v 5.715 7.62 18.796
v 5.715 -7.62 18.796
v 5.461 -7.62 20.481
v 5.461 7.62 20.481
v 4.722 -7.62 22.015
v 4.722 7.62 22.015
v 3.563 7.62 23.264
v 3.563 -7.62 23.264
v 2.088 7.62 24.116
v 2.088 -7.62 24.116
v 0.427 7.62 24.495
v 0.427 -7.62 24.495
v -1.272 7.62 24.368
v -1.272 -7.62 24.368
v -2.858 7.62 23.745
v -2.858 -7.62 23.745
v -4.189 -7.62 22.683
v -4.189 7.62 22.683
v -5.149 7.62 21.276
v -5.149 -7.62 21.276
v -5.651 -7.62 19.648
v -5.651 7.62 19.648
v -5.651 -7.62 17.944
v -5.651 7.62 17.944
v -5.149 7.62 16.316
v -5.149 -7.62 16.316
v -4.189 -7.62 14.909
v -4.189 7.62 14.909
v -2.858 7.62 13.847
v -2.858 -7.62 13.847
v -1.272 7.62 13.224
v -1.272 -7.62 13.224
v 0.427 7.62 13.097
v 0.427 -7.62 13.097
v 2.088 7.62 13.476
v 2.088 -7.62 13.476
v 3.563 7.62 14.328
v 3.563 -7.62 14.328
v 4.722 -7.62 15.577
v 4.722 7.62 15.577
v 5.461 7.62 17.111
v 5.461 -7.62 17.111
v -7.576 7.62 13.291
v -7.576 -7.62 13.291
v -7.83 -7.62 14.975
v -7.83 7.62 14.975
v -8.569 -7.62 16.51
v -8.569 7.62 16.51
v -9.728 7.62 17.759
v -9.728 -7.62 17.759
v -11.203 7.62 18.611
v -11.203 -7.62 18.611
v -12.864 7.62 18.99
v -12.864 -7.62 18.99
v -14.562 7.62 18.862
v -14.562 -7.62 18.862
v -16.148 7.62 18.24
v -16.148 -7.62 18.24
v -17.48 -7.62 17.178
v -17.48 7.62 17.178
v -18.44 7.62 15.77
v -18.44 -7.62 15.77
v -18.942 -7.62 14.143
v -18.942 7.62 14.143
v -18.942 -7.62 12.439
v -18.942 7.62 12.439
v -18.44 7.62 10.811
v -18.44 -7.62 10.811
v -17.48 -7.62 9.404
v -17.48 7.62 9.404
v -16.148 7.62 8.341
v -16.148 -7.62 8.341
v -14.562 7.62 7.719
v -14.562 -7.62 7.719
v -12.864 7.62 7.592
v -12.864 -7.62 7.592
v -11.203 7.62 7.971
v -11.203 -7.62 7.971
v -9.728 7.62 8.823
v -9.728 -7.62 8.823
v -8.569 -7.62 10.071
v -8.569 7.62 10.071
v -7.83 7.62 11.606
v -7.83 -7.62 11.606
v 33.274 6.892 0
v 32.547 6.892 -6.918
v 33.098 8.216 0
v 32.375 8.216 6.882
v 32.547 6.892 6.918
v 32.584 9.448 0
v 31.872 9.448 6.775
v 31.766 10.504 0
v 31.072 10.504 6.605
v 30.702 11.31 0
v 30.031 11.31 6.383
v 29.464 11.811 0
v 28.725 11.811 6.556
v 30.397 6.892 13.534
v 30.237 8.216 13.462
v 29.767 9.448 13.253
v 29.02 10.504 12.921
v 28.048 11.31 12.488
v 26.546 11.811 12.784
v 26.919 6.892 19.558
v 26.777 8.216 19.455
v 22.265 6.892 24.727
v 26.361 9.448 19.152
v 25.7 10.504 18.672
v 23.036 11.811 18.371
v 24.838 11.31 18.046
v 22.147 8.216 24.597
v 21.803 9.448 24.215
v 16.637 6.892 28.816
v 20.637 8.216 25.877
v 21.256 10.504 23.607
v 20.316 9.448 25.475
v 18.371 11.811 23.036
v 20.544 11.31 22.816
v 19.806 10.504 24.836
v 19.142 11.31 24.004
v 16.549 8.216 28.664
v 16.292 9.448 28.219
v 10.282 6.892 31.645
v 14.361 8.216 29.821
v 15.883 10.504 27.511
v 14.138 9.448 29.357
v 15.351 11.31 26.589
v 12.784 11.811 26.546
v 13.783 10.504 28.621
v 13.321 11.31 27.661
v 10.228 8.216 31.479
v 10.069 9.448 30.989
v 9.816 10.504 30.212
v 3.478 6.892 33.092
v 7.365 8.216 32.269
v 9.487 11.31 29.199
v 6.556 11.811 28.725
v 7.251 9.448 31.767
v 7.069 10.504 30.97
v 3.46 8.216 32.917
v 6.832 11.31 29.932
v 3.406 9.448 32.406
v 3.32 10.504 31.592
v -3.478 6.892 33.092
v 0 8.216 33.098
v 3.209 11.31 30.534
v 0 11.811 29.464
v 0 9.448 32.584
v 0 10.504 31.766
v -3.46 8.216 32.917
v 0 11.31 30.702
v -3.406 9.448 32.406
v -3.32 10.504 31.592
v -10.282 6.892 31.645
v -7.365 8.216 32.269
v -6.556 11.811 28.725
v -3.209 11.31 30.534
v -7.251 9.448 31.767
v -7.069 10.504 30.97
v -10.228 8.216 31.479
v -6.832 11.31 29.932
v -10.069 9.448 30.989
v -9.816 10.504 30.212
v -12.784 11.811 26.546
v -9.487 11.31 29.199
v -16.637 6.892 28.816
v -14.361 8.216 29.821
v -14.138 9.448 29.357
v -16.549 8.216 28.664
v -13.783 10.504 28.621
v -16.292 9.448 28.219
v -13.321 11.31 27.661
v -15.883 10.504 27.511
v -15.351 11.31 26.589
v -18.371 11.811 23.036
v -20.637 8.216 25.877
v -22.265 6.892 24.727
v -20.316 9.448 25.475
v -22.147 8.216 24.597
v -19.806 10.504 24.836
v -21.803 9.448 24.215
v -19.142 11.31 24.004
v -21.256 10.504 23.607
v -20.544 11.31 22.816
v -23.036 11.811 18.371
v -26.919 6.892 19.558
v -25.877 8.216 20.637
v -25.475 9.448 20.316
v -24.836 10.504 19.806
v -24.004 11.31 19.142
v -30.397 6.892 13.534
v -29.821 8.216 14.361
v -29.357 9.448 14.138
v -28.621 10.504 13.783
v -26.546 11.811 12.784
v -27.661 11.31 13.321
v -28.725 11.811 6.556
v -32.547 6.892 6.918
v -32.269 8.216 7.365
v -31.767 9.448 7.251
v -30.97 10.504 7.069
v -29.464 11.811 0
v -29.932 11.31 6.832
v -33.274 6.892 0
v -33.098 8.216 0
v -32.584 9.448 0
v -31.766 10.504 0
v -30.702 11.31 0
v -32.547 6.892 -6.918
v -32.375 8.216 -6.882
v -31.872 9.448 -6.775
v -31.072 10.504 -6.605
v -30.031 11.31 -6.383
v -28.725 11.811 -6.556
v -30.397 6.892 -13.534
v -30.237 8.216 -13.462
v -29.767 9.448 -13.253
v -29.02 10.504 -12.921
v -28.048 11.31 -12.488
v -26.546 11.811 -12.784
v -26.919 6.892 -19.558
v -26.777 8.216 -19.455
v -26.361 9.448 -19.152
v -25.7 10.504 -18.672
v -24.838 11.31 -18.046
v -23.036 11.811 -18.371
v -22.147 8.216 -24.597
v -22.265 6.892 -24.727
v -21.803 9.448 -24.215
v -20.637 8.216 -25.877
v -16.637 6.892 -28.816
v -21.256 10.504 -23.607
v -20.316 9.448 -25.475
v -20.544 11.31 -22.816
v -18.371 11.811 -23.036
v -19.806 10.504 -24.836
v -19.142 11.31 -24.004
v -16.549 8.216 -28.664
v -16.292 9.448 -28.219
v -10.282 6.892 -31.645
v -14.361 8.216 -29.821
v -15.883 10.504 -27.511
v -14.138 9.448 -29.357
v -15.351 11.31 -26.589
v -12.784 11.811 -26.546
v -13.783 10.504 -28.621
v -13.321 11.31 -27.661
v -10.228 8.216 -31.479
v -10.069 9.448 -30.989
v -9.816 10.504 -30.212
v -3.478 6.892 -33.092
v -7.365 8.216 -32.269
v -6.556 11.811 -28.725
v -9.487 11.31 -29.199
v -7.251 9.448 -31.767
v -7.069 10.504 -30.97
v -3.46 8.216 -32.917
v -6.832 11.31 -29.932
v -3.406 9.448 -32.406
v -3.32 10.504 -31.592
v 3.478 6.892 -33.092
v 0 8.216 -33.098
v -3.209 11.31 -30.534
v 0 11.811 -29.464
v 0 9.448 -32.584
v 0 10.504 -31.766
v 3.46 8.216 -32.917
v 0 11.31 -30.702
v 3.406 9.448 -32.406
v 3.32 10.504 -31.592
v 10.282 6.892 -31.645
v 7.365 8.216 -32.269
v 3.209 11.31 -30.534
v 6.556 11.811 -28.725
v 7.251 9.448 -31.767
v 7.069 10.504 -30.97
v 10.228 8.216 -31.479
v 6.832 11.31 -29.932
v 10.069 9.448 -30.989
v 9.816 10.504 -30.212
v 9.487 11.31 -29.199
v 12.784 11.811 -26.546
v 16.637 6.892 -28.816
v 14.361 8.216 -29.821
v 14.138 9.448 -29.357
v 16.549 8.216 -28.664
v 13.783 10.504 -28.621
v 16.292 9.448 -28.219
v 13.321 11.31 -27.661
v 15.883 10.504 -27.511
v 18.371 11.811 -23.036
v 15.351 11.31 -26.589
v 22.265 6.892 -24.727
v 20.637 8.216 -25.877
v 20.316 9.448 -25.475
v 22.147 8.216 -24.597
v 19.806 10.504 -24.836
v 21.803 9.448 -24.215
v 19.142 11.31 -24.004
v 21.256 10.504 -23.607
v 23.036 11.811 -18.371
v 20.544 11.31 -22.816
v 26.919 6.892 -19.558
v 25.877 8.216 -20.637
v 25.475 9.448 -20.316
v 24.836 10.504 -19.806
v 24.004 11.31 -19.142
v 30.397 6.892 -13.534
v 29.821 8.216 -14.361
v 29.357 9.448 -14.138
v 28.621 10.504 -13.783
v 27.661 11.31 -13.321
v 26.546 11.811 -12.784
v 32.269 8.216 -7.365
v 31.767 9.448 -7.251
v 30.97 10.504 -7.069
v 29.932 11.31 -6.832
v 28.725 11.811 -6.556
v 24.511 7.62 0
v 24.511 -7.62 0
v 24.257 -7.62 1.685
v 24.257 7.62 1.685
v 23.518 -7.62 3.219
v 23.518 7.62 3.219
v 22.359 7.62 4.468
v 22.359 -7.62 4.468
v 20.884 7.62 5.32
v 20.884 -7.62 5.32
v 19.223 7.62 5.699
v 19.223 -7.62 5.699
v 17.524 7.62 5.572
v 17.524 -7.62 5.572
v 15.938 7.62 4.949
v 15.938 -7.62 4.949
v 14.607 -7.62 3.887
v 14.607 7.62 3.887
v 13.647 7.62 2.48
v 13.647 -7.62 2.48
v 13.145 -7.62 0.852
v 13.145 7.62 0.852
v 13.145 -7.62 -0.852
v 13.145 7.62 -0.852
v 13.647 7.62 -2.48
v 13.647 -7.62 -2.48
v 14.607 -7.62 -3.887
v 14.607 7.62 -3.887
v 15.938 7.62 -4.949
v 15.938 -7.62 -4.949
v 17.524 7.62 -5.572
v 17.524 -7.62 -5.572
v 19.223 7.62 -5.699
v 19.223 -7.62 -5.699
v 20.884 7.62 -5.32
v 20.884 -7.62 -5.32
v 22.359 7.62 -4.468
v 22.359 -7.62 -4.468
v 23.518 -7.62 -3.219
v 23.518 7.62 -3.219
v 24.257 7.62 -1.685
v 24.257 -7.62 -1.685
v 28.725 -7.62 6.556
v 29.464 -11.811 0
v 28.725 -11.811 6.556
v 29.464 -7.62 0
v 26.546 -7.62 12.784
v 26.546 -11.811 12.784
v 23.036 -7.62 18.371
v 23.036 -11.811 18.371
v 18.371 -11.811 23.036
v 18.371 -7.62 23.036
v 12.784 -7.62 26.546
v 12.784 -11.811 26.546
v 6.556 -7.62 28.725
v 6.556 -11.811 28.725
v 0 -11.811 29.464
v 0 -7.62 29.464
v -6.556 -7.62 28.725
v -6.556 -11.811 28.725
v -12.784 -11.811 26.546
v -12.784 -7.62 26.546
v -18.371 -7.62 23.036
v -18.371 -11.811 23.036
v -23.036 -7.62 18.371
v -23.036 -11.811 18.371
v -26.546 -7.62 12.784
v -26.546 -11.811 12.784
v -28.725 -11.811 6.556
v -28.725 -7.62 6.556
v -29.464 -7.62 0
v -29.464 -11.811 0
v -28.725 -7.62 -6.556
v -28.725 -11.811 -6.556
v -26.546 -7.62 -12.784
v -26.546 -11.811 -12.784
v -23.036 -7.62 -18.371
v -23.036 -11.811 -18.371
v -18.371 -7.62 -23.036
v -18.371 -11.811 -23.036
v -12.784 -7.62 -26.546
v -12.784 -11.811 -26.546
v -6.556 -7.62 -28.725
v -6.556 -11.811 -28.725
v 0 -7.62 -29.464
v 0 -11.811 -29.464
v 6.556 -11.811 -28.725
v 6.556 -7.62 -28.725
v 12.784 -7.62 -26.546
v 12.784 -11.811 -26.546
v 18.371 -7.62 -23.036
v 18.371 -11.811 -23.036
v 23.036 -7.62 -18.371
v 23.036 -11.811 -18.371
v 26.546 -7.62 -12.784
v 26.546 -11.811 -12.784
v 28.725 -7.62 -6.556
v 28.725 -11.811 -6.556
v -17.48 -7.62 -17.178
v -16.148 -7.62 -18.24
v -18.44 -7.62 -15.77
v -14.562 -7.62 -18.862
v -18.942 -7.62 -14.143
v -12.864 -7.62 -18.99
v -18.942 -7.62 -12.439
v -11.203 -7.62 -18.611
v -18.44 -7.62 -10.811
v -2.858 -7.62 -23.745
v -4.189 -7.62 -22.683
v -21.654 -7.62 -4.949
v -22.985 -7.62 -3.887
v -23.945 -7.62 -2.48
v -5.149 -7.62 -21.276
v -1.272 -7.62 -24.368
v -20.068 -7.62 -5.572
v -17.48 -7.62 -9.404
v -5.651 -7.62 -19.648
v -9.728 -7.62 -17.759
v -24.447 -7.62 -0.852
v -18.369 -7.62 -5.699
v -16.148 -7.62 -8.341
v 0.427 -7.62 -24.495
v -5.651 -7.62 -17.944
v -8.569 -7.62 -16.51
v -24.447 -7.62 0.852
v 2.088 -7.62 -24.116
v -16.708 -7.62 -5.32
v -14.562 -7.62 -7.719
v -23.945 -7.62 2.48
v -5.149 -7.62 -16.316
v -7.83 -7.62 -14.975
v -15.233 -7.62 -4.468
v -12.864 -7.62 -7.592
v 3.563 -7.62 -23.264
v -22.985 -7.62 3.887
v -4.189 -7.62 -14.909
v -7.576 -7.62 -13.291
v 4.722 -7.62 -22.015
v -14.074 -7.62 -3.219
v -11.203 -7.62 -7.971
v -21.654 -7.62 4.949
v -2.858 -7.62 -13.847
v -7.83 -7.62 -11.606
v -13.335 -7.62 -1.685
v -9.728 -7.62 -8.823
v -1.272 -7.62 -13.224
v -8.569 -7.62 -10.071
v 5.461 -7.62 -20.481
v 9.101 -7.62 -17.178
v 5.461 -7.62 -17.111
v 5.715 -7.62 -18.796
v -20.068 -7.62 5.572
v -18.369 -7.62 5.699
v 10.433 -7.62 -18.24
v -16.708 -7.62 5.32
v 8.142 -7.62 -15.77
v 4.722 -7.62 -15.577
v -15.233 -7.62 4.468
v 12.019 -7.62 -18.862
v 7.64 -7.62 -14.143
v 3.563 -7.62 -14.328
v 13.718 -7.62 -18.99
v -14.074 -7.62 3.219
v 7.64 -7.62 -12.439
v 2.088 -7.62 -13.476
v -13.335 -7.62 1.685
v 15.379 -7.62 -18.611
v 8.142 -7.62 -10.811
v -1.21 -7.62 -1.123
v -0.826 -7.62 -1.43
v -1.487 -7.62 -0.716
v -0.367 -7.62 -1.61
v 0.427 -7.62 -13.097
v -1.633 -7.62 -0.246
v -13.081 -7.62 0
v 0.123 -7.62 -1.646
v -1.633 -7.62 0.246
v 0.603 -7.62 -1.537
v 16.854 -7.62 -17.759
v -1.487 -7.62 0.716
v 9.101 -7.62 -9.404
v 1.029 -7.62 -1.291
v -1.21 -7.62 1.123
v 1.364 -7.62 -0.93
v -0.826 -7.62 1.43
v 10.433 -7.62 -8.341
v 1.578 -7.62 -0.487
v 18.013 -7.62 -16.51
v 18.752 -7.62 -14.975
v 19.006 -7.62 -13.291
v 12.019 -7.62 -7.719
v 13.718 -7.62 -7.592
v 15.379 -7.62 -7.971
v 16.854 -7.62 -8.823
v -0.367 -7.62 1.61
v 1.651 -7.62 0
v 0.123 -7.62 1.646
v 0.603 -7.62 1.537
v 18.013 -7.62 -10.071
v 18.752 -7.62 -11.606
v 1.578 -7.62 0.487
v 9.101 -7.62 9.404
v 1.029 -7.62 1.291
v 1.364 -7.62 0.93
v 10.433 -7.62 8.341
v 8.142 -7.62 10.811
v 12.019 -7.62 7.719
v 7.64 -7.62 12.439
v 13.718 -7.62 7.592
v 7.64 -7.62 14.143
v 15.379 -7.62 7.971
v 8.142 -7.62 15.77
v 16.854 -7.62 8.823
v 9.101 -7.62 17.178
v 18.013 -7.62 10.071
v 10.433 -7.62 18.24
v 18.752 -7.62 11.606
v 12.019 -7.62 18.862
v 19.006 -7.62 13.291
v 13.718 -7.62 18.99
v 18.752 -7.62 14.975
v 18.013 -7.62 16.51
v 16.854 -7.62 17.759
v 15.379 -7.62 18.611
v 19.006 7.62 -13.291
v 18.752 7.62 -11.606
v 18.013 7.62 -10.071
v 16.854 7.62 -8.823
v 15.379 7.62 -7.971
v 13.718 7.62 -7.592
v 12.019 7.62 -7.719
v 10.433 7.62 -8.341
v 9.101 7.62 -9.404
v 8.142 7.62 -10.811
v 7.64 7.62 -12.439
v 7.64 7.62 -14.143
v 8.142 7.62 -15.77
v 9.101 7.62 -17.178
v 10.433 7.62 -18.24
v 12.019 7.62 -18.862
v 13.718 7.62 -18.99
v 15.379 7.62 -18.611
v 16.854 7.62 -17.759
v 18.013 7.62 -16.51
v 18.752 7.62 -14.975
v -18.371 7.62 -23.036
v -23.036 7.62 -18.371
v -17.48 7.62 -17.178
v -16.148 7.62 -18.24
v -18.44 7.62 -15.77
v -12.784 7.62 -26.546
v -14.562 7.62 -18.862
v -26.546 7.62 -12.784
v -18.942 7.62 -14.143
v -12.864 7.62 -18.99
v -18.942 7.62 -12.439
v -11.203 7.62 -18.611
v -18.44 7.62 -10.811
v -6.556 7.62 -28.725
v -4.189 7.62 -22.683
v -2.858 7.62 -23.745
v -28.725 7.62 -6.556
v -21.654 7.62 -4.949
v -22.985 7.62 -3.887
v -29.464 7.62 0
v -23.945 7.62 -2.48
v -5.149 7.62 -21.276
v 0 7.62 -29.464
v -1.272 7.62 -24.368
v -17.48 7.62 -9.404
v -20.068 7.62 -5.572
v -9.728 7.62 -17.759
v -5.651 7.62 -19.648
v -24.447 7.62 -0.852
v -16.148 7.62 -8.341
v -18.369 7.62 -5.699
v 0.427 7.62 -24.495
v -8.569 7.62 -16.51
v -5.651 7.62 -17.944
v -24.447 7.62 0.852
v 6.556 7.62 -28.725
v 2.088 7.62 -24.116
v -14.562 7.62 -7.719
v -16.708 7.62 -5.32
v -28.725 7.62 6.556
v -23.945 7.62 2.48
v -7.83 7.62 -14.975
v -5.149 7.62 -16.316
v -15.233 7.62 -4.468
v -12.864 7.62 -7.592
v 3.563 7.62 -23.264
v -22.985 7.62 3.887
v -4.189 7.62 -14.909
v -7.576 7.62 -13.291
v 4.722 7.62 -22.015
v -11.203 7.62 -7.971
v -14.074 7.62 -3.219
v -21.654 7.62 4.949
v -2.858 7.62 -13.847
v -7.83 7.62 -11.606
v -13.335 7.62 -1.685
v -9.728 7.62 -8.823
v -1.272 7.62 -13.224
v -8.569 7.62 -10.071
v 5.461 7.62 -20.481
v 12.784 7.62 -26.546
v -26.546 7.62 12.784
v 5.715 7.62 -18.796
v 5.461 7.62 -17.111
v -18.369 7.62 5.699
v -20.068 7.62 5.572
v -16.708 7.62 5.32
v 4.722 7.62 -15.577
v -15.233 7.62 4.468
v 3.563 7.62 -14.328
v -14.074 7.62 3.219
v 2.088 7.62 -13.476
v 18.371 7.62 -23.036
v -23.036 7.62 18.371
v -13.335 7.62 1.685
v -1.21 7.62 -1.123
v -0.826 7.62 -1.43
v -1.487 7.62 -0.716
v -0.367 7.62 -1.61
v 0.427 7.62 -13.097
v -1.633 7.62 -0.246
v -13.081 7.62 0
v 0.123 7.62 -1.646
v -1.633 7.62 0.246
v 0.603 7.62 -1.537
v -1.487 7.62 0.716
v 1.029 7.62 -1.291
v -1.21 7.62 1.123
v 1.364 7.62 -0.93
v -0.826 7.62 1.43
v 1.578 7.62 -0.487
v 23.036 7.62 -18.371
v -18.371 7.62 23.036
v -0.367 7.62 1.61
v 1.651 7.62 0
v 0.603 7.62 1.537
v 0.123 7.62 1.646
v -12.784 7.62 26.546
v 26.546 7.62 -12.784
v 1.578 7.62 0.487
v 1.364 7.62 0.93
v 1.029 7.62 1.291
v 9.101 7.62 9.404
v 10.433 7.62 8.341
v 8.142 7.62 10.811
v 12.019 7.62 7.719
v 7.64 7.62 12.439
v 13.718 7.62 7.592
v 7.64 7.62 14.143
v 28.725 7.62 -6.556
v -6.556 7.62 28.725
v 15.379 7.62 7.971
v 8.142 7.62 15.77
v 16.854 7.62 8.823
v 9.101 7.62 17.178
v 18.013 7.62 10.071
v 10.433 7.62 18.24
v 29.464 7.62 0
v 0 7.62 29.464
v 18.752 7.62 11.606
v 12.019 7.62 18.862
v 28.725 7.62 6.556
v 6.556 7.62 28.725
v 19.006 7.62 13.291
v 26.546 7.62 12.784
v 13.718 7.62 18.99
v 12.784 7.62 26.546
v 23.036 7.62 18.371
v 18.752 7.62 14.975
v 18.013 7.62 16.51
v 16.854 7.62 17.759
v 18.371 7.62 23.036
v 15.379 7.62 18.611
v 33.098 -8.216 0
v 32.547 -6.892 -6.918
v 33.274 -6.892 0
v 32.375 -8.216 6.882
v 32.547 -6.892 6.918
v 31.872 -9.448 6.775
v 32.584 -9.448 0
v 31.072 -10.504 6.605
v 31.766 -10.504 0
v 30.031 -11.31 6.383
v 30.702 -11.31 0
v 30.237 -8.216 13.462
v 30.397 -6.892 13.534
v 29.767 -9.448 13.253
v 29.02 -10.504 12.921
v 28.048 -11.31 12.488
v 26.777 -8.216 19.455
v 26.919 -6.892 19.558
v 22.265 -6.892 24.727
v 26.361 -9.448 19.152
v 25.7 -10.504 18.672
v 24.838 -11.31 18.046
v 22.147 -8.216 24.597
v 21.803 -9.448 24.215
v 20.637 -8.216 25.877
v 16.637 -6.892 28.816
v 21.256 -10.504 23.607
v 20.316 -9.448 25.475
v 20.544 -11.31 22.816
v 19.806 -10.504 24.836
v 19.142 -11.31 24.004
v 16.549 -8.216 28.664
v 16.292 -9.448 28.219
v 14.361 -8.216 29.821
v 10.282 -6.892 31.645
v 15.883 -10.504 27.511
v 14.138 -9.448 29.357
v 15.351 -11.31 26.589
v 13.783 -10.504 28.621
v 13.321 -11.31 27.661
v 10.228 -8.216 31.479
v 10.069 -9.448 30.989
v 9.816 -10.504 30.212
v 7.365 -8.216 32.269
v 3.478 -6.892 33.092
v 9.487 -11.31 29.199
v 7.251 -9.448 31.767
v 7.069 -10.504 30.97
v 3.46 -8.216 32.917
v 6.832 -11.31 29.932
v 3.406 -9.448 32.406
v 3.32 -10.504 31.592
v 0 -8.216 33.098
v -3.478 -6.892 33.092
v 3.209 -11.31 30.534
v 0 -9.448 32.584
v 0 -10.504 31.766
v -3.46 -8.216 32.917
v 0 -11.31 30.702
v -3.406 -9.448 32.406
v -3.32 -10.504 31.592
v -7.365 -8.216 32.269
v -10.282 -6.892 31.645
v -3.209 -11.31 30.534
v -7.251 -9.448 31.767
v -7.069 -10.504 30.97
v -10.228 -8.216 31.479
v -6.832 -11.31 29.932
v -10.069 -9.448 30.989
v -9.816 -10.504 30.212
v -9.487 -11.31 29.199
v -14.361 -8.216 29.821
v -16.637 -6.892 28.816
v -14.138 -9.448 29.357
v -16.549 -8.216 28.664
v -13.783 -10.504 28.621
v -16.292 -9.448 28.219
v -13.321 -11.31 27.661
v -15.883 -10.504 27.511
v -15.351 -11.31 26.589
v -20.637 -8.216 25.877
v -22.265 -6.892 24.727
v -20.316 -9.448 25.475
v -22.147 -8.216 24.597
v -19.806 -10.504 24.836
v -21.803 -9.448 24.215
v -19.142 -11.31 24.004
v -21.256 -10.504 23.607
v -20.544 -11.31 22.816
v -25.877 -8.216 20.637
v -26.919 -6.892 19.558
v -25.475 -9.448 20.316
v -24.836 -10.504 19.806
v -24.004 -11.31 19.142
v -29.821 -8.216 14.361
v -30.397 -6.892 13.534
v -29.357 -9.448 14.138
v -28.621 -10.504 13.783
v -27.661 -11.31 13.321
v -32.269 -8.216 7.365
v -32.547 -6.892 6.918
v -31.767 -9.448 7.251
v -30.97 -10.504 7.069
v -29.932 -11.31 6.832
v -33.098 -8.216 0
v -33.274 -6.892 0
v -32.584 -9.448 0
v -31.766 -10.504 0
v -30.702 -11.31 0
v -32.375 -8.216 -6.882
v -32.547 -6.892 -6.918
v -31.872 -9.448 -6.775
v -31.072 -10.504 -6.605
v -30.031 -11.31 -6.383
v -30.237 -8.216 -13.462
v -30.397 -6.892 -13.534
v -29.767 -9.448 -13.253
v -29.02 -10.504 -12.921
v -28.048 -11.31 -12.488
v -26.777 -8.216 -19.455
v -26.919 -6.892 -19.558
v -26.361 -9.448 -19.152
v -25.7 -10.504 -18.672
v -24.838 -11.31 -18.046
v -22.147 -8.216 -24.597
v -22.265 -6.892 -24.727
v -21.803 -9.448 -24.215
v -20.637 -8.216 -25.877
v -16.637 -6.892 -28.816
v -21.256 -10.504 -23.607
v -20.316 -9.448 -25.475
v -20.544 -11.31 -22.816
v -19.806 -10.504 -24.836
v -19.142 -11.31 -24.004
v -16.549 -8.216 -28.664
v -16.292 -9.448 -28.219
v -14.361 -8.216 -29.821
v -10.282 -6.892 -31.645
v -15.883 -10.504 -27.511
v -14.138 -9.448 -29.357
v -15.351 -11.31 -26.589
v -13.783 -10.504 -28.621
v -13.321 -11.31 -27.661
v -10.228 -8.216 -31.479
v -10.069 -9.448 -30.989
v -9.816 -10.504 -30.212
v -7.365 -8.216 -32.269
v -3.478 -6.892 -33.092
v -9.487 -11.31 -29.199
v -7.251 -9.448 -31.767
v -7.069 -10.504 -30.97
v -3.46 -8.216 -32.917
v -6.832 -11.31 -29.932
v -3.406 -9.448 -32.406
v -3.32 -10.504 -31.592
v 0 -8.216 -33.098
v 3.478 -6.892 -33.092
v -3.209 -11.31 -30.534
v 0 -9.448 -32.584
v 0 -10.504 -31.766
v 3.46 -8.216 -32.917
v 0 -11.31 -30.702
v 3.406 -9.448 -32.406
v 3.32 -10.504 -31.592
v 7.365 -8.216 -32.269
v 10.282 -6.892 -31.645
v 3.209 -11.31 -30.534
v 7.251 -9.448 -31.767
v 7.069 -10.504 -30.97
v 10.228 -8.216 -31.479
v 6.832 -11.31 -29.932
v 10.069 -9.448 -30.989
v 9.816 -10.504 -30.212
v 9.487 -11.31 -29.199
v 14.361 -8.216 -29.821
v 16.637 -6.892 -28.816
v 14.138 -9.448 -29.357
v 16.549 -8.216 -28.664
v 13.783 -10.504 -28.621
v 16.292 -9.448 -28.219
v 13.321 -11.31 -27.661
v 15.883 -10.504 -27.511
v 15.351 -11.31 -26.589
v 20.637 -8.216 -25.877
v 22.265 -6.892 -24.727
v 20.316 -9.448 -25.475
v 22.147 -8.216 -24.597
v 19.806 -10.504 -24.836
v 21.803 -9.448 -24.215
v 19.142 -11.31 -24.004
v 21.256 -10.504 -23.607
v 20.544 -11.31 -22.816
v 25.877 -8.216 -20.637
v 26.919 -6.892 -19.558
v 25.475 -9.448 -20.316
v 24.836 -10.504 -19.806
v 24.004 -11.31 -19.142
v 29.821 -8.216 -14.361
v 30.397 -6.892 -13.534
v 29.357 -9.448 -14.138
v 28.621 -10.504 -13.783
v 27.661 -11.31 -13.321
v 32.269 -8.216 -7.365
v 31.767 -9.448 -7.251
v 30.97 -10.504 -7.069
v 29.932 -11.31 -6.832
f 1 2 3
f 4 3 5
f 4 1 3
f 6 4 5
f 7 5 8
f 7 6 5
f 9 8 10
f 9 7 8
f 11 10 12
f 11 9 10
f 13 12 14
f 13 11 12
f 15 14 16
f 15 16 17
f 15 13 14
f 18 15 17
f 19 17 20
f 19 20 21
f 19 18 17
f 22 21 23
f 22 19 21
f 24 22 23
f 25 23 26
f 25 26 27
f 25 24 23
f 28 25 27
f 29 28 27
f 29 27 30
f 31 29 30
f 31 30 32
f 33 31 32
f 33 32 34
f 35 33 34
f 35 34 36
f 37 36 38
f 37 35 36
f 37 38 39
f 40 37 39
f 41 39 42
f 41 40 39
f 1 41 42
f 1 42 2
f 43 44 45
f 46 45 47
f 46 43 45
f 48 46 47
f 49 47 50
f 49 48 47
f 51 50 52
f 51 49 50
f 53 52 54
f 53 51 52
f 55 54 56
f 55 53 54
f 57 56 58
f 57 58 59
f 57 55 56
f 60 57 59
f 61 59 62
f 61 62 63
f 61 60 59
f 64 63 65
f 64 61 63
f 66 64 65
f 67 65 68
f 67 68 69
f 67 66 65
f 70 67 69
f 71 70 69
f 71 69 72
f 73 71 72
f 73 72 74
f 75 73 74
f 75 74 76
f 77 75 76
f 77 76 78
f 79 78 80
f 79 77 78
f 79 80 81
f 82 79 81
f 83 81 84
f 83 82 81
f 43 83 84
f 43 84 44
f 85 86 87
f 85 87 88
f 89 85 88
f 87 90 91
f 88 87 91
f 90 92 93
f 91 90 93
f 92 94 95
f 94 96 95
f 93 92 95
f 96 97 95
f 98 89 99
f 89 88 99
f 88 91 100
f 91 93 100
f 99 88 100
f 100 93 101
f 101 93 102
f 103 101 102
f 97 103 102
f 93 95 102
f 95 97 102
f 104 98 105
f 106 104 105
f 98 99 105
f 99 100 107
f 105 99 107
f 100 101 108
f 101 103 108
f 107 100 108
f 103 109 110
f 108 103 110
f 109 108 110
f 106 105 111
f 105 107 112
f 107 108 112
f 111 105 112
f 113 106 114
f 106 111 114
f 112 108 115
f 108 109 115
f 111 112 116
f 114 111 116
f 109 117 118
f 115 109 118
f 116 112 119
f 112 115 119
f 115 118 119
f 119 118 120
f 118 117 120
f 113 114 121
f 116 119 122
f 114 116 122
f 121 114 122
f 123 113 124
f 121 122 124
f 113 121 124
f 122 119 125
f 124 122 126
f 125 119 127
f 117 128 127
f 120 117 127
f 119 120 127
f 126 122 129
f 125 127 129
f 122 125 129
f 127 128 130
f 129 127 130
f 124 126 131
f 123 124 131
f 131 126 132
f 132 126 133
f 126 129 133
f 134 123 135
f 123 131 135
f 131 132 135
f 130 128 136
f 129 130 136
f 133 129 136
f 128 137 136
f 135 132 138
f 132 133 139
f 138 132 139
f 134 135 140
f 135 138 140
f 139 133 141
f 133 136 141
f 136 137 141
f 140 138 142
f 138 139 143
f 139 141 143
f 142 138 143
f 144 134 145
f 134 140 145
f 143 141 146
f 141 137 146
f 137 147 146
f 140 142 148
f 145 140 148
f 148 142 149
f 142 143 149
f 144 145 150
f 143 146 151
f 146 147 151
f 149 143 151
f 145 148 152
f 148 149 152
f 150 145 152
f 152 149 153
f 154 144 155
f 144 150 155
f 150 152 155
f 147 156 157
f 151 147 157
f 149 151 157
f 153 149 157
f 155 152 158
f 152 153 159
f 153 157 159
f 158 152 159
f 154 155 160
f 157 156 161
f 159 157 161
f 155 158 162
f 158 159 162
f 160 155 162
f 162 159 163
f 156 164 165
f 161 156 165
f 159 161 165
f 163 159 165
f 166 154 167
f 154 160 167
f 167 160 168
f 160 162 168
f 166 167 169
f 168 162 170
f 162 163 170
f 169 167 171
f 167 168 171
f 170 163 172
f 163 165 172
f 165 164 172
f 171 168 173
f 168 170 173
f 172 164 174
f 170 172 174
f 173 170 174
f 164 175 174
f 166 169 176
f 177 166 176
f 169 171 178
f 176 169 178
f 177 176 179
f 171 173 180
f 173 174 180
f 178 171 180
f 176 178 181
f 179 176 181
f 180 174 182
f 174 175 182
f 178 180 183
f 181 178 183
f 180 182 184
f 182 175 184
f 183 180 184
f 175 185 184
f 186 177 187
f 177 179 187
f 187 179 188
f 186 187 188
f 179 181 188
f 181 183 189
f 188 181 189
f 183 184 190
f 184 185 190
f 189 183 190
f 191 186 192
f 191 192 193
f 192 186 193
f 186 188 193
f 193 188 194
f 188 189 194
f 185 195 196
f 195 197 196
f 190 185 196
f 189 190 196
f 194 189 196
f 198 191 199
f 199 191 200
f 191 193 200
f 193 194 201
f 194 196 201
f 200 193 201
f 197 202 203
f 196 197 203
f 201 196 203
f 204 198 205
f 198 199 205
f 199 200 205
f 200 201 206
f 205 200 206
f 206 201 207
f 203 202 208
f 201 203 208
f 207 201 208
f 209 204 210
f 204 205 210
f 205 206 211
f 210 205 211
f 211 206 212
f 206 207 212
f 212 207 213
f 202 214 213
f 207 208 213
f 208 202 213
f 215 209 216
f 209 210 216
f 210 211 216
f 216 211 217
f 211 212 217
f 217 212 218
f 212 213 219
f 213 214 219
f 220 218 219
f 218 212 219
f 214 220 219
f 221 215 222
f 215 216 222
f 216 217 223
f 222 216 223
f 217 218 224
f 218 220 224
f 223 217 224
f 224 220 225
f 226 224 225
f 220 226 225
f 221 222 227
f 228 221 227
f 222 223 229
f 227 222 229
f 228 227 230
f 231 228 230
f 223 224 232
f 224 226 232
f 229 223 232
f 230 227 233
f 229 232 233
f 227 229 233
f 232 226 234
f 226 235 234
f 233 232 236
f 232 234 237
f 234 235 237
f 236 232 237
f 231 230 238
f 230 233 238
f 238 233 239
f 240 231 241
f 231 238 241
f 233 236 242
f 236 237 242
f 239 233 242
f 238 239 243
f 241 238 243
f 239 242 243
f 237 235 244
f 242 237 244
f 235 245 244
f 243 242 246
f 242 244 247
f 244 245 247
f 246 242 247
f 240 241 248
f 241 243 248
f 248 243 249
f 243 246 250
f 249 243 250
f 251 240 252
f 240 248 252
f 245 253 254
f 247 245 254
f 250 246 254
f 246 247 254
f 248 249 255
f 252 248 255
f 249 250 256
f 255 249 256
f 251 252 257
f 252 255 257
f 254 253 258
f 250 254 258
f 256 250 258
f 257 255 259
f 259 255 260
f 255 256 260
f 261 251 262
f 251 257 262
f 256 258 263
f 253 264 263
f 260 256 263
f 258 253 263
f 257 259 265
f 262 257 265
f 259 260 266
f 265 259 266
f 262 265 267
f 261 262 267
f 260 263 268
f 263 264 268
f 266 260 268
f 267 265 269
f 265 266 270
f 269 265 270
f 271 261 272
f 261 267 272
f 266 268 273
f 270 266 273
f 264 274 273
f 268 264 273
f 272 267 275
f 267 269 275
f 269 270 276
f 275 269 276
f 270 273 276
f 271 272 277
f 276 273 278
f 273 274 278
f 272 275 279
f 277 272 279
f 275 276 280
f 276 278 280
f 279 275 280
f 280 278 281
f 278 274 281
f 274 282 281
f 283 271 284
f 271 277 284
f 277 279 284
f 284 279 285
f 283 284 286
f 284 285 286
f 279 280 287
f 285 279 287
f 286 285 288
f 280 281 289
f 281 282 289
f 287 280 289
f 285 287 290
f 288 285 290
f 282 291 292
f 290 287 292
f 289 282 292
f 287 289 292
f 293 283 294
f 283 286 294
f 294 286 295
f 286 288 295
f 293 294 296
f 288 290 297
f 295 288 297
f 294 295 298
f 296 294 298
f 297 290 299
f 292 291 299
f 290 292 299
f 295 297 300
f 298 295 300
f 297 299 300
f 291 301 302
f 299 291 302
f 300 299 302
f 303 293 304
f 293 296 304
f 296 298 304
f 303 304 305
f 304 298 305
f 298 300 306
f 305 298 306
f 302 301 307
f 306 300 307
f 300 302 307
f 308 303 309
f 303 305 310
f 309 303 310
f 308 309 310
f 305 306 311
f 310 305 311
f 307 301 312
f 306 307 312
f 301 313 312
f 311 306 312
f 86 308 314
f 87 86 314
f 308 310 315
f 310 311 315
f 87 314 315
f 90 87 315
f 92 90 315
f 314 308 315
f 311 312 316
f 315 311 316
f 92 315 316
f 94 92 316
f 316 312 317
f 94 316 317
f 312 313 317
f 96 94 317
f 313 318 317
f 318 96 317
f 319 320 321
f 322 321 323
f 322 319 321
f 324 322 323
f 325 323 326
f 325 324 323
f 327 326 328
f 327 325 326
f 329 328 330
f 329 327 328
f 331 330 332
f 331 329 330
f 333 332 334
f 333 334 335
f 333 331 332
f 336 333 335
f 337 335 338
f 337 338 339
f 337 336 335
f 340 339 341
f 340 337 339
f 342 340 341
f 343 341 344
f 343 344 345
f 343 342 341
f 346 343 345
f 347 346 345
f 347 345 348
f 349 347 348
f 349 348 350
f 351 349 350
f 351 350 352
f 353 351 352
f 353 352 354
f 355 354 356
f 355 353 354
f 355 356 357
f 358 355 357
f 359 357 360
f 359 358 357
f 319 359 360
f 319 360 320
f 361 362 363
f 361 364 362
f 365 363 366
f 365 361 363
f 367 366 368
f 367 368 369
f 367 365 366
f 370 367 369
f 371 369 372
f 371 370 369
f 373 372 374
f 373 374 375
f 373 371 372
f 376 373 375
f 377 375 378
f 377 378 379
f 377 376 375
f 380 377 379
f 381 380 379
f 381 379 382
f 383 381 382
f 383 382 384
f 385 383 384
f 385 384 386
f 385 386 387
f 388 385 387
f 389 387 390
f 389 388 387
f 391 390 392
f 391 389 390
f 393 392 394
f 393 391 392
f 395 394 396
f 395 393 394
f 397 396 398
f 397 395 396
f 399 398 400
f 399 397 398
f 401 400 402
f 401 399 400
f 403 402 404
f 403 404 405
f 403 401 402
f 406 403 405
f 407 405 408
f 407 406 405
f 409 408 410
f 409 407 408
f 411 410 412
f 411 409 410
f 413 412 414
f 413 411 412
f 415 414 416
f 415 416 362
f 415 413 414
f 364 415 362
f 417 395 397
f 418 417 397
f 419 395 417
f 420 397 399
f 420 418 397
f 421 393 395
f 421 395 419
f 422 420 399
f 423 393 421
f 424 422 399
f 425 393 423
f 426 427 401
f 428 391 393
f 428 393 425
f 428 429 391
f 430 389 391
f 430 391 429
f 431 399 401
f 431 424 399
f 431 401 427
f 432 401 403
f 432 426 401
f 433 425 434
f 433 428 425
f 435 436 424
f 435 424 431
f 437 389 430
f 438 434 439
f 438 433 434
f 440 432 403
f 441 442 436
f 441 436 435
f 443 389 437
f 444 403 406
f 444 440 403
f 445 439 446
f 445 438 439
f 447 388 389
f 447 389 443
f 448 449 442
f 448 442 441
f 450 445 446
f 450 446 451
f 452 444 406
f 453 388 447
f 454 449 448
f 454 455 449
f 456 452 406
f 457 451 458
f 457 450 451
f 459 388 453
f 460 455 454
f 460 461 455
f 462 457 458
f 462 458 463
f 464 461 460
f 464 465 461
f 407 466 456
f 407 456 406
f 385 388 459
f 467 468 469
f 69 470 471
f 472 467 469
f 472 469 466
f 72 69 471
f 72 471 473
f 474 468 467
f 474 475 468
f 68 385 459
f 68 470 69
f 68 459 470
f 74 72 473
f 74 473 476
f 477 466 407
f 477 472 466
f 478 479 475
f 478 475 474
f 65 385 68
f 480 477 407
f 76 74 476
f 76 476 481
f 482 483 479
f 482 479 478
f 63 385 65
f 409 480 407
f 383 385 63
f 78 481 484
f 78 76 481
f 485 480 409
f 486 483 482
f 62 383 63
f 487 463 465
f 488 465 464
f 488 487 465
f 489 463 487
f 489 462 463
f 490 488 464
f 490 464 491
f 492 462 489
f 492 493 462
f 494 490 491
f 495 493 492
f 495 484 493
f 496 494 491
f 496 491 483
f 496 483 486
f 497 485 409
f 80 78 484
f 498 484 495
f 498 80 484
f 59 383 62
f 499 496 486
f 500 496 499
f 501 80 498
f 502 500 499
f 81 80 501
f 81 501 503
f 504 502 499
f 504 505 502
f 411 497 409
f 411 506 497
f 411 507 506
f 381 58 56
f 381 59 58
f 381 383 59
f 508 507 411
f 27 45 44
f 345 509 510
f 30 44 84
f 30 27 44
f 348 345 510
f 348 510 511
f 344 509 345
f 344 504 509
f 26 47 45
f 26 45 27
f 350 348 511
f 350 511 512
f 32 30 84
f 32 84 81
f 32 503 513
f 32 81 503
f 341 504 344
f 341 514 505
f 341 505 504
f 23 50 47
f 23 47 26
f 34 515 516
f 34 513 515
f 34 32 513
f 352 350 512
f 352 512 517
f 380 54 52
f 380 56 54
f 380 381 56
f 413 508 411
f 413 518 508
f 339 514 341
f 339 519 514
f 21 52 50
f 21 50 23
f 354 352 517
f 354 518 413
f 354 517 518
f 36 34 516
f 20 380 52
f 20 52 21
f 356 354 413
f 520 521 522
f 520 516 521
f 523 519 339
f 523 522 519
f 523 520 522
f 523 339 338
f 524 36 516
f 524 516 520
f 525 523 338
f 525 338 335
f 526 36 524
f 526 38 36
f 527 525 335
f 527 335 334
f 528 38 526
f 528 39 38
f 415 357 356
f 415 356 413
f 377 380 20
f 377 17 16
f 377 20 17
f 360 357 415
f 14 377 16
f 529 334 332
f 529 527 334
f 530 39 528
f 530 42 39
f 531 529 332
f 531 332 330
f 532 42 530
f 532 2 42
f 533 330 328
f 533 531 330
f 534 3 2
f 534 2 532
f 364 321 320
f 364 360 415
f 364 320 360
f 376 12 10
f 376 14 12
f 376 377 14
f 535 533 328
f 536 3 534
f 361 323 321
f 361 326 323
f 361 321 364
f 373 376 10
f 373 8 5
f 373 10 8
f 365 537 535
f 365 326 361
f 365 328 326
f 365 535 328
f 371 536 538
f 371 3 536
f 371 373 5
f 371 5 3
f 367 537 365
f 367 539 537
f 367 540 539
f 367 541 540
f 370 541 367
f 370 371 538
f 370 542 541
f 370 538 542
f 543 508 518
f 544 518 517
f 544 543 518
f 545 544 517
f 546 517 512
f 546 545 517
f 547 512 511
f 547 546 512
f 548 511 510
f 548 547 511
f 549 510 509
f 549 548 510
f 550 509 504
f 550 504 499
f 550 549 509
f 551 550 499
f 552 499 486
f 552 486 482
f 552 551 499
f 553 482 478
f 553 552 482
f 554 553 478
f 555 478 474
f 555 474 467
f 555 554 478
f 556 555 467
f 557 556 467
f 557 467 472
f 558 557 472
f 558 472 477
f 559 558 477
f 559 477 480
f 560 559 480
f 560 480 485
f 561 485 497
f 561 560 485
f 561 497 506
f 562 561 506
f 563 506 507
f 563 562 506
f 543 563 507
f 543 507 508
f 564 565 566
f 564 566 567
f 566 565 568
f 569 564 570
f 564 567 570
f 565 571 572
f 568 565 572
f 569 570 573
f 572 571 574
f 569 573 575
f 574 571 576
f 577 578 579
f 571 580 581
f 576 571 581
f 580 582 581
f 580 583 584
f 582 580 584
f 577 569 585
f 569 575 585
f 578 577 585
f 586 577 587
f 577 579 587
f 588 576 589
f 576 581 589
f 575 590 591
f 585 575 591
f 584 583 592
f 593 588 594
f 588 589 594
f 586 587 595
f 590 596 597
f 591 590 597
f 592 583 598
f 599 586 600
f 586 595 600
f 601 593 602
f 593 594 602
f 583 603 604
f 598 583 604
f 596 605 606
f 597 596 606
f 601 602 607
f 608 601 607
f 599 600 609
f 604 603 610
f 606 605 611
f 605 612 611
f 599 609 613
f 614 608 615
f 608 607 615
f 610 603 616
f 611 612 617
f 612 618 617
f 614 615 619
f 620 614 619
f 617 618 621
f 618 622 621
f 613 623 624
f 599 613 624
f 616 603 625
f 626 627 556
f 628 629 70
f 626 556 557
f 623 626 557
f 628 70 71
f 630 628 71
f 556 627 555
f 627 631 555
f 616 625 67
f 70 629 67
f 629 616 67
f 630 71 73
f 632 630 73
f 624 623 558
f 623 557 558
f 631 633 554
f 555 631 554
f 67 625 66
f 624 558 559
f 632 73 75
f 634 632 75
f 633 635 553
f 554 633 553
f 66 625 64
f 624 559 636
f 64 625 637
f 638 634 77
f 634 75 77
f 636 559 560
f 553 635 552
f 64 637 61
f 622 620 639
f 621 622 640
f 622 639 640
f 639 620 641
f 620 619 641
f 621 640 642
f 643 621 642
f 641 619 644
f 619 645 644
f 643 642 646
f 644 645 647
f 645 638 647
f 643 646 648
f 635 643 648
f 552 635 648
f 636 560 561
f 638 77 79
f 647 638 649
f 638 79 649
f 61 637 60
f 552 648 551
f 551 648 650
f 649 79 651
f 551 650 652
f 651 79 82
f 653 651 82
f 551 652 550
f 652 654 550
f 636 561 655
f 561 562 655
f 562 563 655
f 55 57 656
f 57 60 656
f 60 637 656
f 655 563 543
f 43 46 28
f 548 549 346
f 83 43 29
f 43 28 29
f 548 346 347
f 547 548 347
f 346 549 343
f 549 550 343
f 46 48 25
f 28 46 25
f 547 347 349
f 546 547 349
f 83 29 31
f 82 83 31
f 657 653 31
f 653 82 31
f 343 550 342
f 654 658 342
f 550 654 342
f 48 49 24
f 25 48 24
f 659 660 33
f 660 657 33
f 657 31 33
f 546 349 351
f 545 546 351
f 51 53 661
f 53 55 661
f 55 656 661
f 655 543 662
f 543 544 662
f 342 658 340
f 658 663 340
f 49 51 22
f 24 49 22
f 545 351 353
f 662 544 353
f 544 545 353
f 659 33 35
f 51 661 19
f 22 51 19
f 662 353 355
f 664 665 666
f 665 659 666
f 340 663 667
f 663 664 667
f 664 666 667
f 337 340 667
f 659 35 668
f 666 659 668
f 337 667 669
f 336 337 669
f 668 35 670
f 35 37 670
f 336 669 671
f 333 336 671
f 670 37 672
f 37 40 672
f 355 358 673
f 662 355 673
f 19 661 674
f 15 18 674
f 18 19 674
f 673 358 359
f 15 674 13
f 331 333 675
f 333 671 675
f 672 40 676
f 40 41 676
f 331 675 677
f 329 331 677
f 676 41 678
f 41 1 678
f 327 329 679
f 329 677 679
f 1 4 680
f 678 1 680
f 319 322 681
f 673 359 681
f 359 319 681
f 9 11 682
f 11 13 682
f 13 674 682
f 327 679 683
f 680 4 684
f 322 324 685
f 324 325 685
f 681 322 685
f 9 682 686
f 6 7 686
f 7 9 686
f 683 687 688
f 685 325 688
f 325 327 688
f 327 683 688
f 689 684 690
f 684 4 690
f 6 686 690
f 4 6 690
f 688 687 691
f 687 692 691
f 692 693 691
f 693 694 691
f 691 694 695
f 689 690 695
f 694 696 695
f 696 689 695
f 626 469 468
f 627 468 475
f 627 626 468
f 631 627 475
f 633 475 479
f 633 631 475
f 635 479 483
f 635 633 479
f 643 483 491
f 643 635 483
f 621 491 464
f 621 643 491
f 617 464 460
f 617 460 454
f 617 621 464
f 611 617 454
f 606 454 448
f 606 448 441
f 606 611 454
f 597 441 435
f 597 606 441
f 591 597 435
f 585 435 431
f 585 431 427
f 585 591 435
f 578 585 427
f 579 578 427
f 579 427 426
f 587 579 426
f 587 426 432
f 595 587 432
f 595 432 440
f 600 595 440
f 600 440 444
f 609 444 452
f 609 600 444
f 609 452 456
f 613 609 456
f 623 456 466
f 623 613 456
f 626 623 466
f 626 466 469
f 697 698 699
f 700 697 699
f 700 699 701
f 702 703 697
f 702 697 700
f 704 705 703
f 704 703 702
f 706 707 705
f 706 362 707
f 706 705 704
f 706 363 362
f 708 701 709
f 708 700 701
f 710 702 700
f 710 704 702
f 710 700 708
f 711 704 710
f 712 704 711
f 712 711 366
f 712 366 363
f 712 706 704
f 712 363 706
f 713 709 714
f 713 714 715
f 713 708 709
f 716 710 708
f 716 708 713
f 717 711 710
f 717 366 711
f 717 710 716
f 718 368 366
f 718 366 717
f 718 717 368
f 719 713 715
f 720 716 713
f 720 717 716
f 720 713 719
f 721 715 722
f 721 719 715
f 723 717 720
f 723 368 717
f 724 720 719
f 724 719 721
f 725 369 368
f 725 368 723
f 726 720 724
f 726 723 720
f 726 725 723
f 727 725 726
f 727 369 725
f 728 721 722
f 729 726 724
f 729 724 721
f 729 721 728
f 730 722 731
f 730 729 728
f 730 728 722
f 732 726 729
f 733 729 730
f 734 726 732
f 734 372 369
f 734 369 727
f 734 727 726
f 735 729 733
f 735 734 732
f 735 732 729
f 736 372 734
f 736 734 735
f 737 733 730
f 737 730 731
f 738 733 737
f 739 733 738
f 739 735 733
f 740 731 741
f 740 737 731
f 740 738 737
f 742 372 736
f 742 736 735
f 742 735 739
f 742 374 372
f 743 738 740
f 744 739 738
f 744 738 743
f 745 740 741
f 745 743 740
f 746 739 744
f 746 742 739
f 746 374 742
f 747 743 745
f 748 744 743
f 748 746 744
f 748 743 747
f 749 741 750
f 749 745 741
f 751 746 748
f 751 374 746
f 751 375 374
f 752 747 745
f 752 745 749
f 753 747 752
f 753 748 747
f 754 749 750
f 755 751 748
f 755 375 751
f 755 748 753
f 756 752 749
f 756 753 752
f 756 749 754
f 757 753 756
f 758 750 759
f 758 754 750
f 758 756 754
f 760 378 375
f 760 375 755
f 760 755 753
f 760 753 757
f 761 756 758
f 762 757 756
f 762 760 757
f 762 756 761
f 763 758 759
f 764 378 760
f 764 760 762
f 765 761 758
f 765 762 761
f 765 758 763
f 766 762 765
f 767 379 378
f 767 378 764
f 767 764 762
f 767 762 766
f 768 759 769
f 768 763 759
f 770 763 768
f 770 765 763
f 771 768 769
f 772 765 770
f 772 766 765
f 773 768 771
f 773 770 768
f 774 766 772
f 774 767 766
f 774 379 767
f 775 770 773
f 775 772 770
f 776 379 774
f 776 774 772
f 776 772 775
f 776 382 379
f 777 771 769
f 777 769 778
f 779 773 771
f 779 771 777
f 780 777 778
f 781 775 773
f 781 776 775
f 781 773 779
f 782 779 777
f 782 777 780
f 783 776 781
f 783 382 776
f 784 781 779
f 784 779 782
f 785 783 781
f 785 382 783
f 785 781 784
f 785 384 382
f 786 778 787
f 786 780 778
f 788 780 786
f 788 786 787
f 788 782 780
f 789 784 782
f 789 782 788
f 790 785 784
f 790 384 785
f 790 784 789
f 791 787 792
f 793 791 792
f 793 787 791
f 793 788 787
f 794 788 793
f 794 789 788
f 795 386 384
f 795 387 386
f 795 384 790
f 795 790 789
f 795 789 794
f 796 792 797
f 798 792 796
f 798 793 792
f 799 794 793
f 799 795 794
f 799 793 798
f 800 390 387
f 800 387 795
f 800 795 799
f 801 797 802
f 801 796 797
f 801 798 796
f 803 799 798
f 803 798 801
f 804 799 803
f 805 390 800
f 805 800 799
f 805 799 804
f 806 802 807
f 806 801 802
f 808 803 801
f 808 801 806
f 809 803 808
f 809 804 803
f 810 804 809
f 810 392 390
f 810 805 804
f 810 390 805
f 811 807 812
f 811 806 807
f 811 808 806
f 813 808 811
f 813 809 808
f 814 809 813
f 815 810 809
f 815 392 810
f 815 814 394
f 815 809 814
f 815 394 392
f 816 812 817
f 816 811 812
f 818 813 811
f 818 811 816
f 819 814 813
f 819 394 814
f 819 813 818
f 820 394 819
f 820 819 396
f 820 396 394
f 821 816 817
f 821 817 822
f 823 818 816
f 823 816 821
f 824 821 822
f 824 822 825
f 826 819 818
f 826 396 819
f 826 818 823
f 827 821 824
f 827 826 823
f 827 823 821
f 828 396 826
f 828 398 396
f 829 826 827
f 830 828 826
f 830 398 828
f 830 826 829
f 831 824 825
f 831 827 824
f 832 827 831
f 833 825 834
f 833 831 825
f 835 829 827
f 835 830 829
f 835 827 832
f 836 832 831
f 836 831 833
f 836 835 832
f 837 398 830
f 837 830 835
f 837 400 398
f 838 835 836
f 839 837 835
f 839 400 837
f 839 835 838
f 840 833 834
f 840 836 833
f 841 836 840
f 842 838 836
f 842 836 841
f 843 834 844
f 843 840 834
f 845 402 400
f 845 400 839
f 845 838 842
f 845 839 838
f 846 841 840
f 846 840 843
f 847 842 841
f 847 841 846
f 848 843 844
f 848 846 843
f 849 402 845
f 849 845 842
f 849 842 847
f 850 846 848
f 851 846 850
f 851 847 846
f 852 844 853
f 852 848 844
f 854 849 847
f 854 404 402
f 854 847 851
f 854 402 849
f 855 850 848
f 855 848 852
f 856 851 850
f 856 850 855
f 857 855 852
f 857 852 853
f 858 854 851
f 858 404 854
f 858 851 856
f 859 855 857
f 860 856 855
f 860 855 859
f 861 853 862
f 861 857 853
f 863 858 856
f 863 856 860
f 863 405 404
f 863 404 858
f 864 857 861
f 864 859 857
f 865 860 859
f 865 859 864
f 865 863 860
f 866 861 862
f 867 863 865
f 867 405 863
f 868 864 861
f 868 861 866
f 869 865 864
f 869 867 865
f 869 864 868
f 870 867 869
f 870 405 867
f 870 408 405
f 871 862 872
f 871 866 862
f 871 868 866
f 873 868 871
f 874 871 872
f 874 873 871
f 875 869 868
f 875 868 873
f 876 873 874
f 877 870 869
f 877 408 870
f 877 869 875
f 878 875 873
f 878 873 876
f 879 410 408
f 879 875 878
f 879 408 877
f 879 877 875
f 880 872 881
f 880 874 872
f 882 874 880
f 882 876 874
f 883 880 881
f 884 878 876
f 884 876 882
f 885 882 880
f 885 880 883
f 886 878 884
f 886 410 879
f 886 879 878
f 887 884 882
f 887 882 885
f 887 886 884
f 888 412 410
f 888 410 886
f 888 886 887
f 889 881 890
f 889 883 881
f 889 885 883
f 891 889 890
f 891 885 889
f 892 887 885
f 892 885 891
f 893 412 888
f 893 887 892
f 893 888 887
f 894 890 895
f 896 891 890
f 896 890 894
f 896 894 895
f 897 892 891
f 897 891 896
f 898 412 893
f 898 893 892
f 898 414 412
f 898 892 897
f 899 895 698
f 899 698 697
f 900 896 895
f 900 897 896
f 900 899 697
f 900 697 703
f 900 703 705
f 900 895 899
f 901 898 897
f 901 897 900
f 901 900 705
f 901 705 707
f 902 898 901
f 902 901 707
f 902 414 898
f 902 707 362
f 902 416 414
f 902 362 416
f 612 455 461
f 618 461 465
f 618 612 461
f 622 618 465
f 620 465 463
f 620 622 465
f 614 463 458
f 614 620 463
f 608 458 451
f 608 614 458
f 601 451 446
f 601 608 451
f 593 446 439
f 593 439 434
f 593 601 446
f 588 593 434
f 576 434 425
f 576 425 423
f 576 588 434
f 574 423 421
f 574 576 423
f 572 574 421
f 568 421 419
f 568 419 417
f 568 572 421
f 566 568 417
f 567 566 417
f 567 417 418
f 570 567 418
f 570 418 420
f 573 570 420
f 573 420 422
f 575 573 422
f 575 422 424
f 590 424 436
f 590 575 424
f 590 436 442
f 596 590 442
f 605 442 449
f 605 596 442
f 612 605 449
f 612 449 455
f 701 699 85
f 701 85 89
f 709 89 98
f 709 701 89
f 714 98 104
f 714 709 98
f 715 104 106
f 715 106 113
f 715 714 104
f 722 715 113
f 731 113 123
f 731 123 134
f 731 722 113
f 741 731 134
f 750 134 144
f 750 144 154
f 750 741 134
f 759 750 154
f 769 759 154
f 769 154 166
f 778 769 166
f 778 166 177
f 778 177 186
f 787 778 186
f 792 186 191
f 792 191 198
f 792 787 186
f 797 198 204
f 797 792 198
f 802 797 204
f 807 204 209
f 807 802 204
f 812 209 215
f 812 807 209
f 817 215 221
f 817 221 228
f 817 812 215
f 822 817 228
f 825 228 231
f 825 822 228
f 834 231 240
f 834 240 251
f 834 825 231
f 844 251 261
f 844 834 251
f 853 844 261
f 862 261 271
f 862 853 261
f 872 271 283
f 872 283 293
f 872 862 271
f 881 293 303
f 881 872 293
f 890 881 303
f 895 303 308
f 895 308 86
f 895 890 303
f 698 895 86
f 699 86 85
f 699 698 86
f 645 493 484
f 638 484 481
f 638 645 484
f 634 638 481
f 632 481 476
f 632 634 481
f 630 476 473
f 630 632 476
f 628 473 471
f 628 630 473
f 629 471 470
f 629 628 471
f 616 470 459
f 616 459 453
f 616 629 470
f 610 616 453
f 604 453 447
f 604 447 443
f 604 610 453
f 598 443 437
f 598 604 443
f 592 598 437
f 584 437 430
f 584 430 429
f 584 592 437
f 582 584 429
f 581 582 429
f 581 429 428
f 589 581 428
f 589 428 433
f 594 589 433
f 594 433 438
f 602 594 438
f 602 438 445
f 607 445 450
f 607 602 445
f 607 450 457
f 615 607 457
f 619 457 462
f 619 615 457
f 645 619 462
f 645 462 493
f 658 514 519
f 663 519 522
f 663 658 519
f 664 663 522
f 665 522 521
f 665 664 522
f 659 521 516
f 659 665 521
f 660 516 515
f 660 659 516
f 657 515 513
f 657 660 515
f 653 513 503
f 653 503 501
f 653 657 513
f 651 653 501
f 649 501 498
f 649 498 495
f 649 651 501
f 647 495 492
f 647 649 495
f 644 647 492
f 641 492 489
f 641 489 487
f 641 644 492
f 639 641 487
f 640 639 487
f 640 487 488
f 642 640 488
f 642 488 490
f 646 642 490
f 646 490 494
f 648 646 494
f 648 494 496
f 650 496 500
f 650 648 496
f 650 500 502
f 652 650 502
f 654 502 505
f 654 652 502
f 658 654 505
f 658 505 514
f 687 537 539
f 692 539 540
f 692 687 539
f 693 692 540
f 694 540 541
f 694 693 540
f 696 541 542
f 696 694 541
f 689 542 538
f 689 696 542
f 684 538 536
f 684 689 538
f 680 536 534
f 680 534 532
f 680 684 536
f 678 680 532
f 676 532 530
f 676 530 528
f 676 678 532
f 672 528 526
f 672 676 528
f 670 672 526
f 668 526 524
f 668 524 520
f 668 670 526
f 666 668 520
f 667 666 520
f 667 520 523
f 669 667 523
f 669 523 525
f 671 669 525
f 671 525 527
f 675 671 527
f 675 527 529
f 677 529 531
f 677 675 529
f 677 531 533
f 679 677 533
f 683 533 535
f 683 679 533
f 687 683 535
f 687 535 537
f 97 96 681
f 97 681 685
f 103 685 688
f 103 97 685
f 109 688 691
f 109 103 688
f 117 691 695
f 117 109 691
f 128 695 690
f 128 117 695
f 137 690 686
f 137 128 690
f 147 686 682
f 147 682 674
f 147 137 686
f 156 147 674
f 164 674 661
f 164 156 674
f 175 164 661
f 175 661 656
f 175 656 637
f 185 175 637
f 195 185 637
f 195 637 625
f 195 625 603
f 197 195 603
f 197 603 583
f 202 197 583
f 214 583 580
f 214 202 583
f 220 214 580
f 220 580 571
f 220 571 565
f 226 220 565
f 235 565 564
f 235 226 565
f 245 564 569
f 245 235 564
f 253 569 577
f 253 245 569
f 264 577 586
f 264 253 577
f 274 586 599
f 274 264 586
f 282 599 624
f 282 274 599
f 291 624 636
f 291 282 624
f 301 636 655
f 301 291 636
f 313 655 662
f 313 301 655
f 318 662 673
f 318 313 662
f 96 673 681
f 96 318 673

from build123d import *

# Parameters (mm, degrees)
F0_R     = 29.464
F0_R_2   = 5.715
F0_R_3   = 1.651
F1_DEPTH = 7.62
F0_R_4   = 33.274
F2_DEPTH = 11.811


# Not quite as in the source:
# - a fillet or chamfer that OpenCascade refuses, or shapes differently, is made with other operations: its cross-section is extruded or revolved along the edge and cut away or added


with BuildPart() as f1:
    # F0 (on Front) → F1 (new body, symmetric)
    with BuildSketch(Plane.XZ):
        Circle(F0_R)
        with Locations((-13.2907790592, -13.2907790592)):
            Circle(F0_R_2, mode=Mode.SUBTRACT)
        with Locations((0, -18.796)):
            Circle(F0_R_2, mode=Mode.SUBTRACT)
        with Locations((13.2907790592, -13.2907790592)):
            Circle(F0_R_2, mode=Mode.SUBTRACT)
        with Locations((-18.796, 0)):
            Circle(F0_R_2, mode=Mode.SUBTRACT)
        with Locations((-13.2907790592, 13.2907790592)):
            Circle(F0_R_2, mode=Mode.SUBTRACT)
        Circle(F0_R_3, mode=Mode.SUBTRACT)
        with Locations((13.2907790592, 13.2907790592)):
            Circle(F0_R_2, mode=Mode.SUBTRACT)
        with Locations((18.796, 0)):
            Circle(F0_R_2, mode=Mode.SUBTRACT)
        with Locations((0, 18.796)):
            Circle(F0_R_2, mode=Mode.SUBTRACT)
    extrude(amount=F1_DEPTH, both=True)

    # F0 (on Front) → F2 (join, symmetric)
    with BuildSketch(Plane.XZ):
        Circle(F0_R_4)
        Circle(F0_R, mode=Mode.SUBTRACT)
    extrude(amount=F2_DEPTH, both=True)

    # F3: fillet of radius 5.08 on 3 edges, made by hand

    # F3_s1 → F3_t2 (revolve, cut)
    with BuildSketch(Plane.XY):
        with BuildLine():
            ThreePointArc((33.274, 6.8923111503), (32.2100926284, 10.0031631237), (29.464, 11.811))
            Line((29.464, 11.811), (33.274, 11.811))
            Line((33.274, 11.811), (33.274, 6.8923111503))
        make_face()
    revolve(axis=Axis((0, 11.811, 0), (0, -1, 0)), mode=Mode.SUBTRACT)

    # F3_s3 → F3_t4 (revolve, cut)
    with BuildSketch(Plane.XY):
        with BuildLine():
            ThreePointArc((33.274, -6.8923111503), (32.2100926284, -10.0031631237), (29.464, -11.811))
            Line((29.464, -11.811), (33.274, -11.811))
            Line((33.274, -11.811), (33.274, -6.8923111503))
        make_face()
    revolve(axis=Axis((0, -11.811, 0), (0, -1, 0)), mode=Mode.SUBTRACT)


solid = f1.part
